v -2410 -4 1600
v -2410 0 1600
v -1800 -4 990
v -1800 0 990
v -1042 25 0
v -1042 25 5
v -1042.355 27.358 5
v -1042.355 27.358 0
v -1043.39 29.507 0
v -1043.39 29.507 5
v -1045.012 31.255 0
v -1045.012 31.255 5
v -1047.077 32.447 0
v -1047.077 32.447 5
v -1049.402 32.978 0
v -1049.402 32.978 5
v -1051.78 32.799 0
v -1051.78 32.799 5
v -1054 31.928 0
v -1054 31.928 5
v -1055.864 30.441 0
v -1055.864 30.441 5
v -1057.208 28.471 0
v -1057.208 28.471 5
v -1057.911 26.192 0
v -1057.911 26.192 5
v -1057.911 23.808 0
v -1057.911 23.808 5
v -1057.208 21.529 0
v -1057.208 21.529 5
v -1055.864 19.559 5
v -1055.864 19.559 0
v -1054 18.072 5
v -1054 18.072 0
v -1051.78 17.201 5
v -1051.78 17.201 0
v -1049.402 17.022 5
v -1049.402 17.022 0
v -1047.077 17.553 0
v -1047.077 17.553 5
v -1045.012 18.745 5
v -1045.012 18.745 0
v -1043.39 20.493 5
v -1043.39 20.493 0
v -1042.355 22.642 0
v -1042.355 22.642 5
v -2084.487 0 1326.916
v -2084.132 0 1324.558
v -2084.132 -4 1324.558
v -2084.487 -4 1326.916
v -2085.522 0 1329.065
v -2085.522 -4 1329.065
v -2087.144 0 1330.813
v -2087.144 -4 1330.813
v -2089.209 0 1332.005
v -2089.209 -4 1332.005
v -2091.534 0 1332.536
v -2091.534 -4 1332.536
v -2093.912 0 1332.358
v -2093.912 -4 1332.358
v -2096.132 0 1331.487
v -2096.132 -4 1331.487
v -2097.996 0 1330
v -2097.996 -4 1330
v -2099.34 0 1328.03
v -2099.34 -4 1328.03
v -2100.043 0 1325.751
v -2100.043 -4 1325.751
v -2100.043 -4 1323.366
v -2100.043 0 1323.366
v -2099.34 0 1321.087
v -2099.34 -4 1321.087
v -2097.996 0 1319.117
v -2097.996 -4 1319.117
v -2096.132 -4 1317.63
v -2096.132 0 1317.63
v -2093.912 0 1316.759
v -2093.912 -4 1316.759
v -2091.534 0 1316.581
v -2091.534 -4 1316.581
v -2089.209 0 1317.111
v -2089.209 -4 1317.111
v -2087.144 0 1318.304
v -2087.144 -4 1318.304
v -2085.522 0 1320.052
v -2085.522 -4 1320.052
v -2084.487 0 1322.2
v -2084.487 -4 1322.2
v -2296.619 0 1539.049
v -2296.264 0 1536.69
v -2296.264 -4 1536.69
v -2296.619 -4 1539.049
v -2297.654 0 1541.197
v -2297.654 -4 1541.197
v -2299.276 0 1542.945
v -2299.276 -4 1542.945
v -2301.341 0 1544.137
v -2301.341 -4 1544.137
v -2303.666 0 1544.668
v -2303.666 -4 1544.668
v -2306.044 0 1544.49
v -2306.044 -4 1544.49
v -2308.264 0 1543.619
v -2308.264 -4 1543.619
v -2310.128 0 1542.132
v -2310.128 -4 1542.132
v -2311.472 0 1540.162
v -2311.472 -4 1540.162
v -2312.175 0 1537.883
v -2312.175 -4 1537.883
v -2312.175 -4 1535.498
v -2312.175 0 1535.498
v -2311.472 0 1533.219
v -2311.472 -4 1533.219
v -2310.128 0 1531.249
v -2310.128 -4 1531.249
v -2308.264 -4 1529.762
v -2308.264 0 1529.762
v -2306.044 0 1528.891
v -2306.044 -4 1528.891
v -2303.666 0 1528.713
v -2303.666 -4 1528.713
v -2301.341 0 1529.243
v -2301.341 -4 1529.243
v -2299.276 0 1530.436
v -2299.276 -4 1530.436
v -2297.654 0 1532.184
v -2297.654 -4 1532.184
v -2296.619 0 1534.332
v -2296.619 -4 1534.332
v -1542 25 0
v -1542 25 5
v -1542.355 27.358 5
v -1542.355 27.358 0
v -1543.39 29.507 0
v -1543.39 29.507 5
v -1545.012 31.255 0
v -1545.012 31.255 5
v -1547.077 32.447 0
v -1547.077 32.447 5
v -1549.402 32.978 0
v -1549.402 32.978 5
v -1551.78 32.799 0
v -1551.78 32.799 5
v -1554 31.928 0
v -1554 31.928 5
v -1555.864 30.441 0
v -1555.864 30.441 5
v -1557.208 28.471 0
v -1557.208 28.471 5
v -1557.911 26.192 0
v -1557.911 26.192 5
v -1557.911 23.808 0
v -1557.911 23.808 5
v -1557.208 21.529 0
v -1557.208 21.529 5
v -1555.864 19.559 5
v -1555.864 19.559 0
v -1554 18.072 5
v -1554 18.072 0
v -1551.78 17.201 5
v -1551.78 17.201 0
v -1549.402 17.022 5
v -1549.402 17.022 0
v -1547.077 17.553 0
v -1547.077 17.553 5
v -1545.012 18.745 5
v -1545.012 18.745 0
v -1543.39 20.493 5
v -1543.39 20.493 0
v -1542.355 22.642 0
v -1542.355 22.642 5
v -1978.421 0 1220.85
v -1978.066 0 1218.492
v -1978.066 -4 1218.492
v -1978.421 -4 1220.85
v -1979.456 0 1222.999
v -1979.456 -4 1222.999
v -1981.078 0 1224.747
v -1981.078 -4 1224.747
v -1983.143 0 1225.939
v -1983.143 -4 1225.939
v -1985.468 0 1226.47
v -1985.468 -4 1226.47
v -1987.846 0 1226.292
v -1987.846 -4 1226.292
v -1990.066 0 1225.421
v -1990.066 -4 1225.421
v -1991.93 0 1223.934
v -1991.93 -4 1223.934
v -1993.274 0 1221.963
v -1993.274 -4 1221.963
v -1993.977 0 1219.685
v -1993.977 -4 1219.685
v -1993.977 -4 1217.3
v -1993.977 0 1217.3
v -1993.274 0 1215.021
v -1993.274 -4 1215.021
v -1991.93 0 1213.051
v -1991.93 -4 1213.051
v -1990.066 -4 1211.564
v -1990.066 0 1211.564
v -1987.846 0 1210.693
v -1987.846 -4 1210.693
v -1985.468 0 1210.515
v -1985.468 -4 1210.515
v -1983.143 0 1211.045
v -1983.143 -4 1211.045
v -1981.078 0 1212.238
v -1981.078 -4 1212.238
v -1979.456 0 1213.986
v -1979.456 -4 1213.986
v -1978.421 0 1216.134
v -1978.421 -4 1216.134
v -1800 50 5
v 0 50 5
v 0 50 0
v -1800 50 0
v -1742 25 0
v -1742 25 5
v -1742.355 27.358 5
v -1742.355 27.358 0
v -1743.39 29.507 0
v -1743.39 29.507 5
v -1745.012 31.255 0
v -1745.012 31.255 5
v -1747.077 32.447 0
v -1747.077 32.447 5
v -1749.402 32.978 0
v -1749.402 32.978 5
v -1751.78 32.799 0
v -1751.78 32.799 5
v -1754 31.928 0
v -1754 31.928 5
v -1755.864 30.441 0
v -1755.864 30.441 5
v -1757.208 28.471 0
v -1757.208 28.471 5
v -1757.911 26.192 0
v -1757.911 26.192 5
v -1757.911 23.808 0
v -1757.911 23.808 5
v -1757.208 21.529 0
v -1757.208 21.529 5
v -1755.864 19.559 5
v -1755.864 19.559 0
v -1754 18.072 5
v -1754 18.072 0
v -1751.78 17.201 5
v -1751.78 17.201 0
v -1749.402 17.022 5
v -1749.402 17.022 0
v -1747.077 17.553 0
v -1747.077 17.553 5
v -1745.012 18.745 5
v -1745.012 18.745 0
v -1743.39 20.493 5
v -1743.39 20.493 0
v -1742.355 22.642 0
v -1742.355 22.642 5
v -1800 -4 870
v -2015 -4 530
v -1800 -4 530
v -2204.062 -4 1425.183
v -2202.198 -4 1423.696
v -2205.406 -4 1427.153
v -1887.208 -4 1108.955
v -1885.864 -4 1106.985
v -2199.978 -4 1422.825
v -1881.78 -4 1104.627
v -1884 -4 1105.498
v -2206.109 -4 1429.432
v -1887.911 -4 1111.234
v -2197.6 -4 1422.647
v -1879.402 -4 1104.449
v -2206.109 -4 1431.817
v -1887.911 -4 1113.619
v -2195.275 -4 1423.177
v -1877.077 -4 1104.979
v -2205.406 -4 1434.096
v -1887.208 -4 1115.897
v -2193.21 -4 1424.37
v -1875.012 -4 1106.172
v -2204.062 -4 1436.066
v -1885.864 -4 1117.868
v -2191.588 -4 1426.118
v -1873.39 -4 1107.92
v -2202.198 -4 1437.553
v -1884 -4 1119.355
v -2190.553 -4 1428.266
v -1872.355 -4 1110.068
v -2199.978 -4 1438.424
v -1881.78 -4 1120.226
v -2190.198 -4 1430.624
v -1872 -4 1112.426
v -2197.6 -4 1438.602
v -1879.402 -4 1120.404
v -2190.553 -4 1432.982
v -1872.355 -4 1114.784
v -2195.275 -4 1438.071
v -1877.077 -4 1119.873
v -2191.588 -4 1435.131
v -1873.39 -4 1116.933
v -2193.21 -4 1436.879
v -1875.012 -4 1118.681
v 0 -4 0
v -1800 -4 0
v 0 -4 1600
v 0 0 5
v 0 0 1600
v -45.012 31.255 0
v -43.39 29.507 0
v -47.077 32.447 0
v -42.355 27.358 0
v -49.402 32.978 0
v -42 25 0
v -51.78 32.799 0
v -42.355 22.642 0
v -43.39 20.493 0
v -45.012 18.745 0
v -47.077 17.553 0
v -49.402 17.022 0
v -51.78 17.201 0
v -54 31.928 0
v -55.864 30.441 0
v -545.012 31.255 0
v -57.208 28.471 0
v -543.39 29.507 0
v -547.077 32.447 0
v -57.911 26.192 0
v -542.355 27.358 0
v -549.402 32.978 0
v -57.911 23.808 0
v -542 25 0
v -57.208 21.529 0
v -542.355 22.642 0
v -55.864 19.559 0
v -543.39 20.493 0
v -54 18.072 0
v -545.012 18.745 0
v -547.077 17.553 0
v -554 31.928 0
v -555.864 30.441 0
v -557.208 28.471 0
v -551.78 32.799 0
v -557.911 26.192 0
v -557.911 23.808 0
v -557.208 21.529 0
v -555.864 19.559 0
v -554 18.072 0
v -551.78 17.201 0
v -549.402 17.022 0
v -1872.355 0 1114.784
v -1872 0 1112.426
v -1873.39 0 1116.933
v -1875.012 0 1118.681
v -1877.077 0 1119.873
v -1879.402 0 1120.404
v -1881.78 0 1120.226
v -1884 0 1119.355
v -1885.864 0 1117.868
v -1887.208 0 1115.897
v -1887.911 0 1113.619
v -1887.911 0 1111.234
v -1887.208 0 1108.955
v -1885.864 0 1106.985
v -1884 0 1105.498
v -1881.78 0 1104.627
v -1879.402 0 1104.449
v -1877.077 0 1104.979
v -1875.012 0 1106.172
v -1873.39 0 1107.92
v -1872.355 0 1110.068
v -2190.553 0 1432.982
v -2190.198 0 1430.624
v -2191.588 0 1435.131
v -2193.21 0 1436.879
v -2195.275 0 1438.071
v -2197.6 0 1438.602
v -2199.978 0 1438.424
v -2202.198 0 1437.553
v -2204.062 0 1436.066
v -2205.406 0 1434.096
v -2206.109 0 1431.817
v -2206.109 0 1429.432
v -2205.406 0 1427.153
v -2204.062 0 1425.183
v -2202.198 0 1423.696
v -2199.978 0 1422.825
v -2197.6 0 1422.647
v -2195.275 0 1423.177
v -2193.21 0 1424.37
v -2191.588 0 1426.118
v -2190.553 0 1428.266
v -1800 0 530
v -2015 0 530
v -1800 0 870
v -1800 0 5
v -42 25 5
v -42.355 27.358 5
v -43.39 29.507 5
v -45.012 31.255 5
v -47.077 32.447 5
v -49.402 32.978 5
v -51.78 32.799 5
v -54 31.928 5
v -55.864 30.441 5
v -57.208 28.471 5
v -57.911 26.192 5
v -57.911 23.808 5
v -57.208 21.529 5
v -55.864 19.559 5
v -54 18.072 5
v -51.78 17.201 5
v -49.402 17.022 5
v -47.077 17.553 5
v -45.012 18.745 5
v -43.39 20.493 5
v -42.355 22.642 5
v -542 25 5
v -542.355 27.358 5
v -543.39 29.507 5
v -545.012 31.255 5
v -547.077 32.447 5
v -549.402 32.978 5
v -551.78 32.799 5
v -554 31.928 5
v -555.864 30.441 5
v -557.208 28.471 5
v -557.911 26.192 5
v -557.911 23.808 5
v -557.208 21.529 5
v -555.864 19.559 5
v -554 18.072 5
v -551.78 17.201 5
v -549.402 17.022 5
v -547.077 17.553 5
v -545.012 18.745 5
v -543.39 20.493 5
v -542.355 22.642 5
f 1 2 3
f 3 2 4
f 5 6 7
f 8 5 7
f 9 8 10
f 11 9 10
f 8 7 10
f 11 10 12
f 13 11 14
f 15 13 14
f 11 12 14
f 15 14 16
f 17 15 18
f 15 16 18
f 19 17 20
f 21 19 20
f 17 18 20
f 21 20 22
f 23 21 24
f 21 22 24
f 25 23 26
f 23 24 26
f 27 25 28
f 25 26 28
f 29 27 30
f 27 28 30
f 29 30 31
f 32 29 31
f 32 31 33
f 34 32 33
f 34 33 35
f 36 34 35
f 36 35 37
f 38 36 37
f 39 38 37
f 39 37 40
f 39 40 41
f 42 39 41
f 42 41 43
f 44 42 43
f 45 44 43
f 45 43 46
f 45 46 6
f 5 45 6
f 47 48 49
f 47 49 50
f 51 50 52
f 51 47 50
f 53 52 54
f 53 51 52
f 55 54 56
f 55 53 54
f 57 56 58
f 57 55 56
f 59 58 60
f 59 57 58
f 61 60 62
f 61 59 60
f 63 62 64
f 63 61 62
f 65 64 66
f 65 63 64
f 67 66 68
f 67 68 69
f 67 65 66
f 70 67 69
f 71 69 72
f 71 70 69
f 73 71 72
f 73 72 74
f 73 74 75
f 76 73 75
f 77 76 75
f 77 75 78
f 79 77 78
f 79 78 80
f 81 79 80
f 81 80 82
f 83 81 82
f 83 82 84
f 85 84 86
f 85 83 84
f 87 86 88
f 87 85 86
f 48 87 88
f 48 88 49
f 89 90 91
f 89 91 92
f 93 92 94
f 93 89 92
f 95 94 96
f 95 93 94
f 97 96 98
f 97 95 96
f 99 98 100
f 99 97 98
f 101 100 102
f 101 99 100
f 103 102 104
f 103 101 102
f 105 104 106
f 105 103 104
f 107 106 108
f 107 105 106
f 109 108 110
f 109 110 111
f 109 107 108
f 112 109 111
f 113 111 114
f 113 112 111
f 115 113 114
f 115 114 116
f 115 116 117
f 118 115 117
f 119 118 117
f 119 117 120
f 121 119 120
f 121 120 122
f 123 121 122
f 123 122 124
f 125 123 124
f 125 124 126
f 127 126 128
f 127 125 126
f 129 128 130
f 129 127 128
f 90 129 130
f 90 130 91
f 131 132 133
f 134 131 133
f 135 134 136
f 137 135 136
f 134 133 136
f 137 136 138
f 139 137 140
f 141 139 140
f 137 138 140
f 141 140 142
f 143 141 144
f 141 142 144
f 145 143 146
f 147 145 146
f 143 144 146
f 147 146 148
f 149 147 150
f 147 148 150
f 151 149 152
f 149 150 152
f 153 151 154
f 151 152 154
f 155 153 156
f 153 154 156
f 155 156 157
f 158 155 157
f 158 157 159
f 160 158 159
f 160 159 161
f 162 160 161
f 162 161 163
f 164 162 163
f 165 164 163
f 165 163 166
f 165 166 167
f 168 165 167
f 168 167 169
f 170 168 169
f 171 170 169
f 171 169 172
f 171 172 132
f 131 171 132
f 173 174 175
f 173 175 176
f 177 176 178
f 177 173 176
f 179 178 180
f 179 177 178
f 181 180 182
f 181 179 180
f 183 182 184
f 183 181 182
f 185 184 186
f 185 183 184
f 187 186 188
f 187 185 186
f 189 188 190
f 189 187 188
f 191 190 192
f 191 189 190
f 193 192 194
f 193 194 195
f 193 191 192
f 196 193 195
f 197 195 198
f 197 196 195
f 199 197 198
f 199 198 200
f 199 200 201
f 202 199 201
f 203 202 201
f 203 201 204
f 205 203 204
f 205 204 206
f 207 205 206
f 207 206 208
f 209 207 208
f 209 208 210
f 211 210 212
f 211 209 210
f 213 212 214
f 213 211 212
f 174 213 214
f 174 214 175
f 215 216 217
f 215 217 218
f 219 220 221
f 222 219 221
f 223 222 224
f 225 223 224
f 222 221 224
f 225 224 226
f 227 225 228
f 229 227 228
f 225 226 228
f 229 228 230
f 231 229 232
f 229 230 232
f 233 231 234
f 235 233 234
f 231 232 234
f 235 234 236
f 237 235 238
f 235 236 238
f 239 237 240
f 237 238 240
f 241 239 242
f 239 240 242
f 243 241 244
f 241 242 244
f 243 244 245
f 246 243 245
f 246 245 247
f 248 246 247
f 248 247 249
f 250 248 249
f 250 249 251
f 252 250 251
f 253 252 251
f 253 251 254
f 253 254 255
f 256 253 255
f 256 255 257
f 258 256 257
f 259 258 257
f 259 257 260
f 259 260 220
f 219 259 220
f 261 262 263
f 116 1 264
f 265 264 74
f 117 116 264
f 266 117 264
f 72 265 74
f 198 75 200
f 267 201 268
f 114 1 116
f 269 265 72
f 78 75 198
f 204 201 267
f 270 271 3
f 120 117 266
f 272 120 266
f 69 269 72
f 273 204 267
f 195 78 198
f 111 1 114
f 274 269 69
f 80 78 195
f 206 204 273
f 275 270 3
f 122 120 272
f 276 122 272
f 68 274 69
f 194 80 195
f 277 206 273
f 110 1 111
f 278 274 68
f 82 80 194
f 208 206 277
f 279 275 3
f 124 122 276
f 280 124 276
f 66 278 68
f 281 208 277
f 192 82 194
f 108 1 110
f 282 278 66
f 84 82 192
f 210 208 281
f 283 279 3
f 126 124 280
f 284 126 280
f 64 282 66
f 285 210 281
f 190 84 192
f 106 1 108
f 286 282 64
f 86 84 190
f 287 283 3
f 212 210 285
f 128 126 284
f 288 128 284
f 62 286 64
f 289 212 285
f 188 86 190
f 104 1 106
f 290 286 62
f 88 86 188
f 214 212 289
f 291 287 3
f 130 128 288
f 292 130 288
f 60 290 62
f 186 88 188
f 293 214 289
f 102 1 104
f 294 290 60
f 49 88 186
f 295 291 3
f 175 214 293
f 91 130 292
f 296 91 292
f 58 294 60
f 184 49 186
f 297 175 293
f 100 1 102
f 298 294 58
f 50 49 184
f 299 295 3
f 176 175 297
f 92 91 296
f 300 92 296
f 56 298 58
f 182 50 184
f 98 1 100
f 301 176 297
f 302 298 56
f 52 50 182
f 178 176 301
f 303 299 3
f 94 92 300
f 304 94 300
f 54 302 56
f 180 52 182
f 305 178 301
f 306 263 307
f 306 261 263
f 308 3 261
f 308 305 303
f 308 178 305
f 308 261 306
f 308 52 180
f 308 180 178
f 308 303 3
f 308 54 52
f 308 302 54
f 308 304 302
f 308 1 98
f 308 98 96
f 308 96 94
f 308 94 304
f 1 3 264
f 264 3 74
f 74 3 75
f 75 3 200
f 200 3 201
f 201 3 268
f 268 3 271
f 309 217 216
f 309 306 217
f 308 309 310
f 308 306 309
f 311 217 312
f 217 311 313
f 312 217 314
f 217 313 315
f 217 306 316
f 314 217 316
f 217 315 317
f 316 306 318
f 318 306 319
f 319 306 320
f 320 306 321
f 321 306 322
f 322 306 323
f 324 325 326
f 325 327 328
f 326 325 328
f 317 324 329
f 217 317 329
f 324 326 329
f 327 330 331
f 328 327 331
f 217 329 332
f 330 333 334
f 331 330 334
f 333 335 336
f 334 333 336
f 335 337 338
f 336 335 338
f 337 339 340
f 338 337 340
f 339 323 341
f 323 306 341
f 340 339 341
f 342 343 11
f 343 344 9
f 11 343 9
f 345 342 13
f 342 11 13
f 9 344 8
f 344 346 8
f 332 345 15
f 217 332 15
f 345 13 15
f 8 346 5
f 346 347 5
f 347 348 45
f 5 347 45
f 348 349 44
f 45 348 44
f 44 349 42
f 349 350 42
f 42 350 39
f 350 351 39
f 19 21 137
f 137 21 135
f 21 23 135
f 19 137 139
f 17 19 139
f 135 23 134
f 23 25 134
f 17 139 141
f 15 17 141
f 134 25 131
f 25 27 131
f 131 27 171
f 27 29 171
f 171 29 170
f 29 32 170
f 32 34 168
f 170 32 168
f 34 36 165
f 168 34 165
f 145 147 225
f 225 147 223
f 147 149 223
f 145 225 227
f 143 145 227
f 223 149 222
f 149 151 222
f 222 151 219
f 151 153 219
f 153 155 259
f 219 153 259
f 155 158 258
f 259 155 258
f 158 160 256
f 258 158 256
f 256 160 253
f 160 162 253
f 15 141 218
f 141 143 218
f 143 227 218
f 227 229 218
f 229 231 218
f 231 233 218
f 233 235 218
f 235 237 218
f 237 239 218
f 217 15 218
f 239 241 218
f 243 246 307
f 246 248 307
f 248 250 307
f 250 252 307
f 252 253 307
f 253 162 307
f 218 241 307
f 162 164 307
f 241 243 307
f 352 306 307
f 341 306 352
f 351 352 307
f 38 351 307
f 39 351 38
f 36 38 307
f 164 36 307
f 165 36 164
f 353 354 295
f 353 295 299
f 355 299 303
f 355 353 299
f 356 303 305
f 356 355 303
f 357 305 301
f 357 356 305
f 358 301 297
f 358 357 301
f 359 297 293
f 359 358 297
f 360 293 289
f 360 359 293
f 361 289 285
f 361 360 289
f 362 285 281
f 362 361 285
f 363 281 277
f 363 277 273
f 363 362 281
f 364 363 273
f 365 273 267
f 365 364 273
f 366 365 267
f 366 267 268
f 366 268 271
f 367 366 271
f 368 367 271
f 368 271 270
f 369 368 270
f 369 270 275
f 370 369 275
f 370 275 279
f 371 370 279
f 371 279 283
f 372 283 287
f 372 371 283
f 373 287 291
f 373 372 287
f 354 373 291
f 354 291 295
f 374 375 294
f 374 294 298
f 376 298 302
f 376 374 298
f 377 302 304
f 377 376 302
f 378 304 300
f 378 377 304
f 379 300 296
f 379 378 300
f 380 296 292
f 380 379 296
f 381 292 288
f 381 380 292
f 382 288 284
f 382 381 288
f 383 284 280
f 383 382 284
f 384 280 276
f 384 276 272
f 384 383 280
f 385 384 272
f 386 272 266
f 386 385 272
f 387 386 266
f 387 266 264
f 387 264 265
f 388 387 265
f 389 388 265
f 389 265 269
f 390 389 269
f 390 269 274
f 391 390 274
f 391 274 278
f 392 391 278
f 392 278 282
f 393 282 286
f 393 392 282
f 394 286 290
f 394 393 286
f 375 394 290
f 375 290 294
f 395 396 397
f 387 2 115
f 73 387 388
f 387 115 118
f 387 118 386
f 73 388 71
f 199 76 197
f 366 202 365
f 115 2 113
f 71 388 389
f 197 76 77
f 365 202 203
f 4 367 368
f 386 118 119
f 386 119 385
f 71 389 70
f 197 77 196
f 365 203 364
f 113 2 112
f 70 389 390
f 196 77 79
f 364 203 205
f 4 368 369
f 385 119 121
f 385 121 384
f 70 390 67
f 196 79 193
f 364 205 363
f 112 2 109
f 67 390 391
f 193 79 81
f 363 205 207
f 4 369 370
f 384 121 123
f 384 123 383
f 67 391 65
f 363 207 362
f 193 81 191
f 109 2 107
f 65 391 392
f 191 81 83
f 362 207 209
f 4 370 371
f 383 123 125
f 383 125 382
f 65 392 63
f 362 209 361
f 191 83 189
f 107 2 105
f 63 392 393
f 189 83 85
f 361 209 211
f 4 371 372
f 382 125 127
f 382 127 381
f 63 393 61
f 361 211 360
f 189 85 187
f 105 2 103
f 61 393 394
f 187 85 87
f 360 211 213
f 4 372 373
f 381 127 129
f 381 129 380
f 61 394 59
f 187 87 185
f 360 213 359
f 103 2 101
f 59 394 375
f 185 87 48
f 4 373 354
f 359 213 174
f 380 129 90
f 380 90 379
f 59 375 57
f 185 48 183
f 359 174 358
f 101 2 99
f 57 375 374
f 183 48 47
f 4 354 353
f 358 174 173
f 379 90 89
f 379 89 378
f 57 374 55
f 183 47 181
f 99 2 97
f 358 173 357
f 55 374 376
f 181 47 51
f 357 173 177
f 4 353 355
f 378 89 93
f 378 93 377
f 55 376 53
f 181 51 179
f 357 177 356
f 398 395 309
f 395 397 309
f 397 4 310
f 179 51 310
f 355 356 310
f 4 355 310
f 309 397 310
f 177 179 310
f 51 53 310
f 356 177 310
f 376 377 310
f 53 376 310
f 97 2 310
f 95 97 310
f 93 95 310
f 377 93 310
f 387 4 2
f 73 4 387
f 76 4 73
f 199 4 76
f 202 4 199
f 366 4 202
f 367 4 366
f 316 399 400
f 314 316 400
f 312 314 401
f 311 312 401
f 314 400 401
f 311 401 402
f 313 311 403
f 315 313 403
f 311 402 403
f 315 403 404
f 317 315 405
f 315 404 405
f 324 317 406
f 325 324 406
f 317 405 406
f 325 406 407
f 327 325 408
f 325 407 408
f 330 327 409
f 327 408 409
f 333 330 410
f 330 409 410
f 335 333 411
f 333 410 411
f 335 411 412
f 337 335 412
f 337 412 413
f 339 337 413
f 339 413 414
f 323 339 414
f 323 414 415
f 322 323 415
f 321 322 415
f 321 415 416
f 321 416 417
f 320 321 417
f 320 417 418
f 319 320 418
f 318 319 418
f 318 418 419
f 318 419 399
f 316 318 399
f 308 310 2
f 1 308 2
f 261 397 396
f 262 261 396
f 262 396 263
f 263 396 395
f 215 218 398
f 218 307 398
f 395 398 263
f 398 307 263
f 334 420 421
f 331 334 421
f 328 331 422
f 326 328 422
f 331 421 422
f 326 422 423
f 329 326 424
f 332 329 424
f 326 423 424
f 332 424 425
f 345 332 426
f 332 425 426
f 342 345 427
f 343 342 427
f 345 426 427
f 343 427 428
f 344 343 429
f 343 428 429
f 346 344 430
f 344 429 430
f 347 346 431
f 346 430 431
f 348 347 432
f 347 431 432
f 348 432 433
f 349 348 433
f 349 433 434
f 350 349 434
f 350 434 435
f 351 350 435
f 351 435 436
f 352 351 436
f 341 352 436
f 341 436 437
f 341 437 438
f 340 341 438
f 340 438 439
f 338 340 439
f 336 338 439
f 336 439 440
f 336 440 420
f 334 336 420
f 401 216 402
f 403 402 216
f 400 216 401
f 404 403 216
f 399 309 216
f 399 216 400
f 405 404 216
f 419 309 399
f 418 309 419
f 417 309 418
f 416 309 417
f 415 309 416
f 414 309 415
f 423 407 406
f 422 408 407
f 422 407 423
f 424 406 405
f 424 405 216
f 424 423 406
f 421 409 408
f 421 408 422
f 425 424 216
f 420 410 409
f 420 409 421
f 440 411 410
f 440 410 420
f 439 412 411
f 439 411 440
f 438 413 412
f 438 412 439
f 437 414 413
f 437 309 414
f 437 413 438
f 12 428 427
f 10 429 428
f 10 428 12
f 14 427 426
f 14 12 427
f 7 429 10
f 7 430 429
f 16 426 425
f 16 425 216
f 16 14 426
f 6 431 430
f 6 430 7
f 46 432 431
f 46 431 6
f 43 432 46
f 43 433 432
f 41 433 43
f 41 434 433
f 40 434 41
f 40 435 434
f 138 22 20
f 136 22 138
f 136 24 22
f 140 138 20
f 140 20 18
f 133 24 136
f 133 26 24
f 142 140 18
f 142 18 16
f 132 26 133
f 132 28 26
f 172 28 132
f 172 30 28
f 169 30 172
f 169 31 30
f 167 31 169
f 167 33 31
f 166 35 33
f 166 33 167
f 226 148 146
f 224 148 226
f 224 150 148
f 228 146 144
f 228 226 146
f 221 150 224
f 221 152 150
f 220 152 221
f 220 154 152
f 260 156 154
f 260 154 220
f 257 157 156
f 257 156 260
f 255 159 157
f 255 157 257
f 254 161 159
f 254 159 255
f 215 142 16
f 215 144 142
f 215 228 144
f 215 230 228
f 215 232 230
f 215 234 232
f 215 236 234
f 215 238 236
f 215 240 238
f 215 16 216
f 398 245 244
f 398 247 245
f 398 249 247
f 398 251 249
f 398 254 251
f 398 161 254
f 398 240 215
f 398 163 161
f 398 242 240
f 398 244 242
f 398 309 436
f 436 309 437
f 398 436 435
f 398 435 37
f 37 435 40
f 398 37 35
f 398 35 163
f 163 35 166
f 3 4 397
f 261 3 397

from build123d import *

# Parameters (mm, degrees)
F0_R     = 8
F1_DEPTH = 4
F2_W     = 1800
F2_H     = 5
F3_DEPTH = 50
F4_R     = 8
F5_DEPTH = 25


with BuildPart() as f1:
    # F0 (on Front) → F1 (new body)
    with BuildSketch(Plane.XZ):
        Polygon((-1800, 0), (0, 0), (0, 1600), (-2410, 1600), (-1800, 990), (-1800, 870), (-2015, 530), (-1800, 530), align=None)
        with Locations((-1880, 1112.426407)):
            Circle(F0_R, mode=Mode.SUBTRACT)
        with Locations((-1986.066017, 1218.492424)):
            Circle(F0_R, mode=Mode.SUBTRACT)
        with Locations((-2092.132034, 1324.558441)):
            Circle(F0_R, mode=Mode.SUBTRACT)
        with Locations((-2198.198052, 1430.624458)):
            Circle(F0_R, mode=Mode.SUBTRACT)
        with Locations((-2304.264069, 1536.690476)):
            Circle(F0_R, mode=Mode.SUBTRACT)
    extrude(amount=F1_DEPTH)

    # F2 (on face) → F3 (join)
    with BuildSketch(Plane(origin=(0, 0, 0), x_dir=(-1, 0, 0), z_dir=(0, 1, 0))):
        with Locations((900, 2.5)):
            Rectangle(F2_W, F2_H)
    extrude(amount=F3_DEPTH)

    # F4 (on face) → F5 (cut)
    with BuildSketch(Plane.XY.offset(5)):
        with Locations((-50, 25)):
            Circle(F4_R)
        with Locations((-550, 25)):
            Circle(F4_R)
        with Locations((-1050, 25)):
            Circle(F4_R)
        with Locations((-1550, 25)):
            Circle(F4_R)
        with Locations((-1750, 25)):
            Circle(F4_R)
    extrude(amount=-F5_DEPTH, mode=Mode.SUBTRACT)


solid = f1.part
